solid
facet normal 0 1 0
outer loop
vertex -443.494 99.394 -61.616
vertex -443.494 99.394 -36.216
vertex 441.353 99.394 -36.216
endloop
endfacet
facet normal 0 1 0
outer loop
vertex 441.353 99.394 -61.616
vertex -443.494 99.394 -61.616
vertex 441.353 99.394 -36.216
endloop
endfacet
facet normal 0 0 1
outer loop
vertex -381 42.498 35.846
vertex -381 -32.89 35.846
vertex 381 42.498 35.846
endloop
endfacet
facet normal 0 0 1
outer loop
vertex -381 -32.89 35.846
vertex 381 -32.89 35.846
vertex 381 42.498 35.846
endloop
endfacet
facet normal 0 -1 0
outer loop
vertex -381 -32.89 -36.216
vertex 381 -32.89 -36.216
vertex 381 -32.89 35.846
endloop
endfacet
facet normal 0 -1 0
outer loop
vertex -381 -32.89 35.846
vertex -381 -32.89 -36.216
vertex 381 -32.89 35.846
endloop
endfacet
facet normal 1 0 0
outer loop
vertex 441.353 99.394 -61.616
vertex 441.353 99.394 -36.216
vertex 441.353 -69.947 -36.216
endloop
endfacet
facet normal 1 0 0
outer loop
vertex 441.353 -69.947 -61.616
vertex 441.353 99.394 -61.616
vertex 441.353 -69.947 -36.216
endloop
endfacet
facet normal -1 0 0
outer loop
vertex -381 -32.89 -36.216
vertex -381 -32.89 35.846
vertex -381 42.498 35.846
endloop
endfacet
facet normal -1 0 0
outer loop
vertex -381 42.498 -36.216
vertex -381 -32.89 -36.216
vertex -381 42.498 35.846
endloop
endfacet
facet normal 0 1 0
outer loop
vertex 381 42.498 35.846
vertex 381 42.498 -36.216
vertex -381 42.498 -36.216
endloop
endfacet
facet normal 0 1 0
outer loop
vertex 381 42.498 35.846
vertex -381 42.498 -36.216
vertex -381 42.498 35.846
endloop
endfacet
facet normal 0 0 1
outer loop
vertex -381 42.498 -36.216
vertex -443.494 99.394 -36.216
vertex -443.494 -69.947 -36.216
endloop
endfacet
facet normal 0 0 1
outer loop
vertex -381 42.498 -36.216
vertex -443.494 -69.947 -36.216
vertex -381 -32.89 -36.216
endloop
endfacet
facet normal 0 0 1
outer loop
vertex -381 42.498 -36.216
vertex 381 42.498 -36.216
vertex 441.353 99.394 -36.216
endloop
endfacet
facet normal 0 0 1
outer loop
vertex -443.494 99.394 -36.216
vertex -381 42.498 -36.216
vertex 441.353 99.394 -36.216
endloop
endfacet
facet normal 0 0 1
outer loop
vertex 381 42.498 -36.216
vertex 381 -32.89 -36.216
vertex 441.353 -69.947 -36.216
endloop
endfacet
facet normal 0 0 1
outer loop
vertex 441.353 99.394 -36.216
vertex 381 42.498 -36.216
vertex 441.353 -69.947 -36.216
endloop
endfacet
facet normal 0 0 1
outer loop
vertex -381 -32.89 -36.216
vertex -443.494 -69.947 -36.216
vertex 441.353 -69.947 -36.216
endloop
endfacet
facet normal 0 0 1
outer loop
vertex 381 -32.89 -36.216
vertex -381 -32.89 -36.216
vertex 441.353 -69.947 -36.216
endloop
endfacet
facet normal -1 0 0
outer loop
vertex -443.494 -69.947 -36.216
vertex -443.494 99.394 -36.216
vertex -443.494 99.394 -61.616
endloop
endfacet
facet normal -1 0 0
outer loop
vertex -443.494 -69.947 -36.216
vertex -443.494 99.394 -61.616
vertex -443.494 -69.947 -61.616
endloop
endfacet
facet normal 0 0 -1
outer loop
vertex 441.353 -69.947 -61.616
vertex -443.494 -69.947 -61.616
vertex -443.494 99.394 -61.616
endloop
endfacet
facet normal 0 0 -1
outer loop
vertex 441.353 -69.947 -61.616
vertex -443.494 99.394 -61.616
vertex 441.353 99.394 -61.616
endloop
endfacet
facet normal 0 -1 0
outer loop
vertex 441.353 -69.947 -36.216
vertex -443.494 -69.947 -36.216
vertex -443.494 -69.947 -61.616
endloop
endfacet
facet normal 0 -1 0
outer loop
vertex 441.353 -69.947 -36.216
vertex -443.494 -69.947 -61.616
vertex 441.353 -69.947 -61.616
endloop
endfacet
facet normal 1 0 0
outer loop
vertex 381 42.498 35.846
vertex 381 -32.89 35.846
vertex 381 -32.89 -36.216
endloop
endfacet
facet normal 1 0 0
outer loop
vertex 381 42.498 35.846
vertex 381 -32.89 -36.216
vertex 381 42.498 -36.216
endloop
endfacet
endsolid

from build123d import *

# Parameters (mm, degrees)
F0_W     = 75.3882750869
F0_H     = 72.0623135567
F1_DEPTH = 381
F2_W     = 884.8471343517
F2_H     = 169.3414449692
F3_DEPTH = 25.4


with BuildPart() as f1:
    # F0 (on Right) → F1 (new body, symmetric)
    with BuildSketch(Plane.YZ):
        with Locations((4.8041529953, -0.1847893)):
            Rectangle(F0_W, F0_H)
    extrude(amount=F1_DEPTH, both=True)

    # F2 (on face) → F3 (join)
    with BuildSketch(Plane(origin=(0, 0, -36.2159460783), x_dir=(1, 0, 0), z_dir=(0, 0, -1))):
        with Locations((-1.0705441236, -14.7237181664)):
            Rectangle(F2_W, F2_H)
    extrude(amount=F3_DEPTH)


solid = f1.part
